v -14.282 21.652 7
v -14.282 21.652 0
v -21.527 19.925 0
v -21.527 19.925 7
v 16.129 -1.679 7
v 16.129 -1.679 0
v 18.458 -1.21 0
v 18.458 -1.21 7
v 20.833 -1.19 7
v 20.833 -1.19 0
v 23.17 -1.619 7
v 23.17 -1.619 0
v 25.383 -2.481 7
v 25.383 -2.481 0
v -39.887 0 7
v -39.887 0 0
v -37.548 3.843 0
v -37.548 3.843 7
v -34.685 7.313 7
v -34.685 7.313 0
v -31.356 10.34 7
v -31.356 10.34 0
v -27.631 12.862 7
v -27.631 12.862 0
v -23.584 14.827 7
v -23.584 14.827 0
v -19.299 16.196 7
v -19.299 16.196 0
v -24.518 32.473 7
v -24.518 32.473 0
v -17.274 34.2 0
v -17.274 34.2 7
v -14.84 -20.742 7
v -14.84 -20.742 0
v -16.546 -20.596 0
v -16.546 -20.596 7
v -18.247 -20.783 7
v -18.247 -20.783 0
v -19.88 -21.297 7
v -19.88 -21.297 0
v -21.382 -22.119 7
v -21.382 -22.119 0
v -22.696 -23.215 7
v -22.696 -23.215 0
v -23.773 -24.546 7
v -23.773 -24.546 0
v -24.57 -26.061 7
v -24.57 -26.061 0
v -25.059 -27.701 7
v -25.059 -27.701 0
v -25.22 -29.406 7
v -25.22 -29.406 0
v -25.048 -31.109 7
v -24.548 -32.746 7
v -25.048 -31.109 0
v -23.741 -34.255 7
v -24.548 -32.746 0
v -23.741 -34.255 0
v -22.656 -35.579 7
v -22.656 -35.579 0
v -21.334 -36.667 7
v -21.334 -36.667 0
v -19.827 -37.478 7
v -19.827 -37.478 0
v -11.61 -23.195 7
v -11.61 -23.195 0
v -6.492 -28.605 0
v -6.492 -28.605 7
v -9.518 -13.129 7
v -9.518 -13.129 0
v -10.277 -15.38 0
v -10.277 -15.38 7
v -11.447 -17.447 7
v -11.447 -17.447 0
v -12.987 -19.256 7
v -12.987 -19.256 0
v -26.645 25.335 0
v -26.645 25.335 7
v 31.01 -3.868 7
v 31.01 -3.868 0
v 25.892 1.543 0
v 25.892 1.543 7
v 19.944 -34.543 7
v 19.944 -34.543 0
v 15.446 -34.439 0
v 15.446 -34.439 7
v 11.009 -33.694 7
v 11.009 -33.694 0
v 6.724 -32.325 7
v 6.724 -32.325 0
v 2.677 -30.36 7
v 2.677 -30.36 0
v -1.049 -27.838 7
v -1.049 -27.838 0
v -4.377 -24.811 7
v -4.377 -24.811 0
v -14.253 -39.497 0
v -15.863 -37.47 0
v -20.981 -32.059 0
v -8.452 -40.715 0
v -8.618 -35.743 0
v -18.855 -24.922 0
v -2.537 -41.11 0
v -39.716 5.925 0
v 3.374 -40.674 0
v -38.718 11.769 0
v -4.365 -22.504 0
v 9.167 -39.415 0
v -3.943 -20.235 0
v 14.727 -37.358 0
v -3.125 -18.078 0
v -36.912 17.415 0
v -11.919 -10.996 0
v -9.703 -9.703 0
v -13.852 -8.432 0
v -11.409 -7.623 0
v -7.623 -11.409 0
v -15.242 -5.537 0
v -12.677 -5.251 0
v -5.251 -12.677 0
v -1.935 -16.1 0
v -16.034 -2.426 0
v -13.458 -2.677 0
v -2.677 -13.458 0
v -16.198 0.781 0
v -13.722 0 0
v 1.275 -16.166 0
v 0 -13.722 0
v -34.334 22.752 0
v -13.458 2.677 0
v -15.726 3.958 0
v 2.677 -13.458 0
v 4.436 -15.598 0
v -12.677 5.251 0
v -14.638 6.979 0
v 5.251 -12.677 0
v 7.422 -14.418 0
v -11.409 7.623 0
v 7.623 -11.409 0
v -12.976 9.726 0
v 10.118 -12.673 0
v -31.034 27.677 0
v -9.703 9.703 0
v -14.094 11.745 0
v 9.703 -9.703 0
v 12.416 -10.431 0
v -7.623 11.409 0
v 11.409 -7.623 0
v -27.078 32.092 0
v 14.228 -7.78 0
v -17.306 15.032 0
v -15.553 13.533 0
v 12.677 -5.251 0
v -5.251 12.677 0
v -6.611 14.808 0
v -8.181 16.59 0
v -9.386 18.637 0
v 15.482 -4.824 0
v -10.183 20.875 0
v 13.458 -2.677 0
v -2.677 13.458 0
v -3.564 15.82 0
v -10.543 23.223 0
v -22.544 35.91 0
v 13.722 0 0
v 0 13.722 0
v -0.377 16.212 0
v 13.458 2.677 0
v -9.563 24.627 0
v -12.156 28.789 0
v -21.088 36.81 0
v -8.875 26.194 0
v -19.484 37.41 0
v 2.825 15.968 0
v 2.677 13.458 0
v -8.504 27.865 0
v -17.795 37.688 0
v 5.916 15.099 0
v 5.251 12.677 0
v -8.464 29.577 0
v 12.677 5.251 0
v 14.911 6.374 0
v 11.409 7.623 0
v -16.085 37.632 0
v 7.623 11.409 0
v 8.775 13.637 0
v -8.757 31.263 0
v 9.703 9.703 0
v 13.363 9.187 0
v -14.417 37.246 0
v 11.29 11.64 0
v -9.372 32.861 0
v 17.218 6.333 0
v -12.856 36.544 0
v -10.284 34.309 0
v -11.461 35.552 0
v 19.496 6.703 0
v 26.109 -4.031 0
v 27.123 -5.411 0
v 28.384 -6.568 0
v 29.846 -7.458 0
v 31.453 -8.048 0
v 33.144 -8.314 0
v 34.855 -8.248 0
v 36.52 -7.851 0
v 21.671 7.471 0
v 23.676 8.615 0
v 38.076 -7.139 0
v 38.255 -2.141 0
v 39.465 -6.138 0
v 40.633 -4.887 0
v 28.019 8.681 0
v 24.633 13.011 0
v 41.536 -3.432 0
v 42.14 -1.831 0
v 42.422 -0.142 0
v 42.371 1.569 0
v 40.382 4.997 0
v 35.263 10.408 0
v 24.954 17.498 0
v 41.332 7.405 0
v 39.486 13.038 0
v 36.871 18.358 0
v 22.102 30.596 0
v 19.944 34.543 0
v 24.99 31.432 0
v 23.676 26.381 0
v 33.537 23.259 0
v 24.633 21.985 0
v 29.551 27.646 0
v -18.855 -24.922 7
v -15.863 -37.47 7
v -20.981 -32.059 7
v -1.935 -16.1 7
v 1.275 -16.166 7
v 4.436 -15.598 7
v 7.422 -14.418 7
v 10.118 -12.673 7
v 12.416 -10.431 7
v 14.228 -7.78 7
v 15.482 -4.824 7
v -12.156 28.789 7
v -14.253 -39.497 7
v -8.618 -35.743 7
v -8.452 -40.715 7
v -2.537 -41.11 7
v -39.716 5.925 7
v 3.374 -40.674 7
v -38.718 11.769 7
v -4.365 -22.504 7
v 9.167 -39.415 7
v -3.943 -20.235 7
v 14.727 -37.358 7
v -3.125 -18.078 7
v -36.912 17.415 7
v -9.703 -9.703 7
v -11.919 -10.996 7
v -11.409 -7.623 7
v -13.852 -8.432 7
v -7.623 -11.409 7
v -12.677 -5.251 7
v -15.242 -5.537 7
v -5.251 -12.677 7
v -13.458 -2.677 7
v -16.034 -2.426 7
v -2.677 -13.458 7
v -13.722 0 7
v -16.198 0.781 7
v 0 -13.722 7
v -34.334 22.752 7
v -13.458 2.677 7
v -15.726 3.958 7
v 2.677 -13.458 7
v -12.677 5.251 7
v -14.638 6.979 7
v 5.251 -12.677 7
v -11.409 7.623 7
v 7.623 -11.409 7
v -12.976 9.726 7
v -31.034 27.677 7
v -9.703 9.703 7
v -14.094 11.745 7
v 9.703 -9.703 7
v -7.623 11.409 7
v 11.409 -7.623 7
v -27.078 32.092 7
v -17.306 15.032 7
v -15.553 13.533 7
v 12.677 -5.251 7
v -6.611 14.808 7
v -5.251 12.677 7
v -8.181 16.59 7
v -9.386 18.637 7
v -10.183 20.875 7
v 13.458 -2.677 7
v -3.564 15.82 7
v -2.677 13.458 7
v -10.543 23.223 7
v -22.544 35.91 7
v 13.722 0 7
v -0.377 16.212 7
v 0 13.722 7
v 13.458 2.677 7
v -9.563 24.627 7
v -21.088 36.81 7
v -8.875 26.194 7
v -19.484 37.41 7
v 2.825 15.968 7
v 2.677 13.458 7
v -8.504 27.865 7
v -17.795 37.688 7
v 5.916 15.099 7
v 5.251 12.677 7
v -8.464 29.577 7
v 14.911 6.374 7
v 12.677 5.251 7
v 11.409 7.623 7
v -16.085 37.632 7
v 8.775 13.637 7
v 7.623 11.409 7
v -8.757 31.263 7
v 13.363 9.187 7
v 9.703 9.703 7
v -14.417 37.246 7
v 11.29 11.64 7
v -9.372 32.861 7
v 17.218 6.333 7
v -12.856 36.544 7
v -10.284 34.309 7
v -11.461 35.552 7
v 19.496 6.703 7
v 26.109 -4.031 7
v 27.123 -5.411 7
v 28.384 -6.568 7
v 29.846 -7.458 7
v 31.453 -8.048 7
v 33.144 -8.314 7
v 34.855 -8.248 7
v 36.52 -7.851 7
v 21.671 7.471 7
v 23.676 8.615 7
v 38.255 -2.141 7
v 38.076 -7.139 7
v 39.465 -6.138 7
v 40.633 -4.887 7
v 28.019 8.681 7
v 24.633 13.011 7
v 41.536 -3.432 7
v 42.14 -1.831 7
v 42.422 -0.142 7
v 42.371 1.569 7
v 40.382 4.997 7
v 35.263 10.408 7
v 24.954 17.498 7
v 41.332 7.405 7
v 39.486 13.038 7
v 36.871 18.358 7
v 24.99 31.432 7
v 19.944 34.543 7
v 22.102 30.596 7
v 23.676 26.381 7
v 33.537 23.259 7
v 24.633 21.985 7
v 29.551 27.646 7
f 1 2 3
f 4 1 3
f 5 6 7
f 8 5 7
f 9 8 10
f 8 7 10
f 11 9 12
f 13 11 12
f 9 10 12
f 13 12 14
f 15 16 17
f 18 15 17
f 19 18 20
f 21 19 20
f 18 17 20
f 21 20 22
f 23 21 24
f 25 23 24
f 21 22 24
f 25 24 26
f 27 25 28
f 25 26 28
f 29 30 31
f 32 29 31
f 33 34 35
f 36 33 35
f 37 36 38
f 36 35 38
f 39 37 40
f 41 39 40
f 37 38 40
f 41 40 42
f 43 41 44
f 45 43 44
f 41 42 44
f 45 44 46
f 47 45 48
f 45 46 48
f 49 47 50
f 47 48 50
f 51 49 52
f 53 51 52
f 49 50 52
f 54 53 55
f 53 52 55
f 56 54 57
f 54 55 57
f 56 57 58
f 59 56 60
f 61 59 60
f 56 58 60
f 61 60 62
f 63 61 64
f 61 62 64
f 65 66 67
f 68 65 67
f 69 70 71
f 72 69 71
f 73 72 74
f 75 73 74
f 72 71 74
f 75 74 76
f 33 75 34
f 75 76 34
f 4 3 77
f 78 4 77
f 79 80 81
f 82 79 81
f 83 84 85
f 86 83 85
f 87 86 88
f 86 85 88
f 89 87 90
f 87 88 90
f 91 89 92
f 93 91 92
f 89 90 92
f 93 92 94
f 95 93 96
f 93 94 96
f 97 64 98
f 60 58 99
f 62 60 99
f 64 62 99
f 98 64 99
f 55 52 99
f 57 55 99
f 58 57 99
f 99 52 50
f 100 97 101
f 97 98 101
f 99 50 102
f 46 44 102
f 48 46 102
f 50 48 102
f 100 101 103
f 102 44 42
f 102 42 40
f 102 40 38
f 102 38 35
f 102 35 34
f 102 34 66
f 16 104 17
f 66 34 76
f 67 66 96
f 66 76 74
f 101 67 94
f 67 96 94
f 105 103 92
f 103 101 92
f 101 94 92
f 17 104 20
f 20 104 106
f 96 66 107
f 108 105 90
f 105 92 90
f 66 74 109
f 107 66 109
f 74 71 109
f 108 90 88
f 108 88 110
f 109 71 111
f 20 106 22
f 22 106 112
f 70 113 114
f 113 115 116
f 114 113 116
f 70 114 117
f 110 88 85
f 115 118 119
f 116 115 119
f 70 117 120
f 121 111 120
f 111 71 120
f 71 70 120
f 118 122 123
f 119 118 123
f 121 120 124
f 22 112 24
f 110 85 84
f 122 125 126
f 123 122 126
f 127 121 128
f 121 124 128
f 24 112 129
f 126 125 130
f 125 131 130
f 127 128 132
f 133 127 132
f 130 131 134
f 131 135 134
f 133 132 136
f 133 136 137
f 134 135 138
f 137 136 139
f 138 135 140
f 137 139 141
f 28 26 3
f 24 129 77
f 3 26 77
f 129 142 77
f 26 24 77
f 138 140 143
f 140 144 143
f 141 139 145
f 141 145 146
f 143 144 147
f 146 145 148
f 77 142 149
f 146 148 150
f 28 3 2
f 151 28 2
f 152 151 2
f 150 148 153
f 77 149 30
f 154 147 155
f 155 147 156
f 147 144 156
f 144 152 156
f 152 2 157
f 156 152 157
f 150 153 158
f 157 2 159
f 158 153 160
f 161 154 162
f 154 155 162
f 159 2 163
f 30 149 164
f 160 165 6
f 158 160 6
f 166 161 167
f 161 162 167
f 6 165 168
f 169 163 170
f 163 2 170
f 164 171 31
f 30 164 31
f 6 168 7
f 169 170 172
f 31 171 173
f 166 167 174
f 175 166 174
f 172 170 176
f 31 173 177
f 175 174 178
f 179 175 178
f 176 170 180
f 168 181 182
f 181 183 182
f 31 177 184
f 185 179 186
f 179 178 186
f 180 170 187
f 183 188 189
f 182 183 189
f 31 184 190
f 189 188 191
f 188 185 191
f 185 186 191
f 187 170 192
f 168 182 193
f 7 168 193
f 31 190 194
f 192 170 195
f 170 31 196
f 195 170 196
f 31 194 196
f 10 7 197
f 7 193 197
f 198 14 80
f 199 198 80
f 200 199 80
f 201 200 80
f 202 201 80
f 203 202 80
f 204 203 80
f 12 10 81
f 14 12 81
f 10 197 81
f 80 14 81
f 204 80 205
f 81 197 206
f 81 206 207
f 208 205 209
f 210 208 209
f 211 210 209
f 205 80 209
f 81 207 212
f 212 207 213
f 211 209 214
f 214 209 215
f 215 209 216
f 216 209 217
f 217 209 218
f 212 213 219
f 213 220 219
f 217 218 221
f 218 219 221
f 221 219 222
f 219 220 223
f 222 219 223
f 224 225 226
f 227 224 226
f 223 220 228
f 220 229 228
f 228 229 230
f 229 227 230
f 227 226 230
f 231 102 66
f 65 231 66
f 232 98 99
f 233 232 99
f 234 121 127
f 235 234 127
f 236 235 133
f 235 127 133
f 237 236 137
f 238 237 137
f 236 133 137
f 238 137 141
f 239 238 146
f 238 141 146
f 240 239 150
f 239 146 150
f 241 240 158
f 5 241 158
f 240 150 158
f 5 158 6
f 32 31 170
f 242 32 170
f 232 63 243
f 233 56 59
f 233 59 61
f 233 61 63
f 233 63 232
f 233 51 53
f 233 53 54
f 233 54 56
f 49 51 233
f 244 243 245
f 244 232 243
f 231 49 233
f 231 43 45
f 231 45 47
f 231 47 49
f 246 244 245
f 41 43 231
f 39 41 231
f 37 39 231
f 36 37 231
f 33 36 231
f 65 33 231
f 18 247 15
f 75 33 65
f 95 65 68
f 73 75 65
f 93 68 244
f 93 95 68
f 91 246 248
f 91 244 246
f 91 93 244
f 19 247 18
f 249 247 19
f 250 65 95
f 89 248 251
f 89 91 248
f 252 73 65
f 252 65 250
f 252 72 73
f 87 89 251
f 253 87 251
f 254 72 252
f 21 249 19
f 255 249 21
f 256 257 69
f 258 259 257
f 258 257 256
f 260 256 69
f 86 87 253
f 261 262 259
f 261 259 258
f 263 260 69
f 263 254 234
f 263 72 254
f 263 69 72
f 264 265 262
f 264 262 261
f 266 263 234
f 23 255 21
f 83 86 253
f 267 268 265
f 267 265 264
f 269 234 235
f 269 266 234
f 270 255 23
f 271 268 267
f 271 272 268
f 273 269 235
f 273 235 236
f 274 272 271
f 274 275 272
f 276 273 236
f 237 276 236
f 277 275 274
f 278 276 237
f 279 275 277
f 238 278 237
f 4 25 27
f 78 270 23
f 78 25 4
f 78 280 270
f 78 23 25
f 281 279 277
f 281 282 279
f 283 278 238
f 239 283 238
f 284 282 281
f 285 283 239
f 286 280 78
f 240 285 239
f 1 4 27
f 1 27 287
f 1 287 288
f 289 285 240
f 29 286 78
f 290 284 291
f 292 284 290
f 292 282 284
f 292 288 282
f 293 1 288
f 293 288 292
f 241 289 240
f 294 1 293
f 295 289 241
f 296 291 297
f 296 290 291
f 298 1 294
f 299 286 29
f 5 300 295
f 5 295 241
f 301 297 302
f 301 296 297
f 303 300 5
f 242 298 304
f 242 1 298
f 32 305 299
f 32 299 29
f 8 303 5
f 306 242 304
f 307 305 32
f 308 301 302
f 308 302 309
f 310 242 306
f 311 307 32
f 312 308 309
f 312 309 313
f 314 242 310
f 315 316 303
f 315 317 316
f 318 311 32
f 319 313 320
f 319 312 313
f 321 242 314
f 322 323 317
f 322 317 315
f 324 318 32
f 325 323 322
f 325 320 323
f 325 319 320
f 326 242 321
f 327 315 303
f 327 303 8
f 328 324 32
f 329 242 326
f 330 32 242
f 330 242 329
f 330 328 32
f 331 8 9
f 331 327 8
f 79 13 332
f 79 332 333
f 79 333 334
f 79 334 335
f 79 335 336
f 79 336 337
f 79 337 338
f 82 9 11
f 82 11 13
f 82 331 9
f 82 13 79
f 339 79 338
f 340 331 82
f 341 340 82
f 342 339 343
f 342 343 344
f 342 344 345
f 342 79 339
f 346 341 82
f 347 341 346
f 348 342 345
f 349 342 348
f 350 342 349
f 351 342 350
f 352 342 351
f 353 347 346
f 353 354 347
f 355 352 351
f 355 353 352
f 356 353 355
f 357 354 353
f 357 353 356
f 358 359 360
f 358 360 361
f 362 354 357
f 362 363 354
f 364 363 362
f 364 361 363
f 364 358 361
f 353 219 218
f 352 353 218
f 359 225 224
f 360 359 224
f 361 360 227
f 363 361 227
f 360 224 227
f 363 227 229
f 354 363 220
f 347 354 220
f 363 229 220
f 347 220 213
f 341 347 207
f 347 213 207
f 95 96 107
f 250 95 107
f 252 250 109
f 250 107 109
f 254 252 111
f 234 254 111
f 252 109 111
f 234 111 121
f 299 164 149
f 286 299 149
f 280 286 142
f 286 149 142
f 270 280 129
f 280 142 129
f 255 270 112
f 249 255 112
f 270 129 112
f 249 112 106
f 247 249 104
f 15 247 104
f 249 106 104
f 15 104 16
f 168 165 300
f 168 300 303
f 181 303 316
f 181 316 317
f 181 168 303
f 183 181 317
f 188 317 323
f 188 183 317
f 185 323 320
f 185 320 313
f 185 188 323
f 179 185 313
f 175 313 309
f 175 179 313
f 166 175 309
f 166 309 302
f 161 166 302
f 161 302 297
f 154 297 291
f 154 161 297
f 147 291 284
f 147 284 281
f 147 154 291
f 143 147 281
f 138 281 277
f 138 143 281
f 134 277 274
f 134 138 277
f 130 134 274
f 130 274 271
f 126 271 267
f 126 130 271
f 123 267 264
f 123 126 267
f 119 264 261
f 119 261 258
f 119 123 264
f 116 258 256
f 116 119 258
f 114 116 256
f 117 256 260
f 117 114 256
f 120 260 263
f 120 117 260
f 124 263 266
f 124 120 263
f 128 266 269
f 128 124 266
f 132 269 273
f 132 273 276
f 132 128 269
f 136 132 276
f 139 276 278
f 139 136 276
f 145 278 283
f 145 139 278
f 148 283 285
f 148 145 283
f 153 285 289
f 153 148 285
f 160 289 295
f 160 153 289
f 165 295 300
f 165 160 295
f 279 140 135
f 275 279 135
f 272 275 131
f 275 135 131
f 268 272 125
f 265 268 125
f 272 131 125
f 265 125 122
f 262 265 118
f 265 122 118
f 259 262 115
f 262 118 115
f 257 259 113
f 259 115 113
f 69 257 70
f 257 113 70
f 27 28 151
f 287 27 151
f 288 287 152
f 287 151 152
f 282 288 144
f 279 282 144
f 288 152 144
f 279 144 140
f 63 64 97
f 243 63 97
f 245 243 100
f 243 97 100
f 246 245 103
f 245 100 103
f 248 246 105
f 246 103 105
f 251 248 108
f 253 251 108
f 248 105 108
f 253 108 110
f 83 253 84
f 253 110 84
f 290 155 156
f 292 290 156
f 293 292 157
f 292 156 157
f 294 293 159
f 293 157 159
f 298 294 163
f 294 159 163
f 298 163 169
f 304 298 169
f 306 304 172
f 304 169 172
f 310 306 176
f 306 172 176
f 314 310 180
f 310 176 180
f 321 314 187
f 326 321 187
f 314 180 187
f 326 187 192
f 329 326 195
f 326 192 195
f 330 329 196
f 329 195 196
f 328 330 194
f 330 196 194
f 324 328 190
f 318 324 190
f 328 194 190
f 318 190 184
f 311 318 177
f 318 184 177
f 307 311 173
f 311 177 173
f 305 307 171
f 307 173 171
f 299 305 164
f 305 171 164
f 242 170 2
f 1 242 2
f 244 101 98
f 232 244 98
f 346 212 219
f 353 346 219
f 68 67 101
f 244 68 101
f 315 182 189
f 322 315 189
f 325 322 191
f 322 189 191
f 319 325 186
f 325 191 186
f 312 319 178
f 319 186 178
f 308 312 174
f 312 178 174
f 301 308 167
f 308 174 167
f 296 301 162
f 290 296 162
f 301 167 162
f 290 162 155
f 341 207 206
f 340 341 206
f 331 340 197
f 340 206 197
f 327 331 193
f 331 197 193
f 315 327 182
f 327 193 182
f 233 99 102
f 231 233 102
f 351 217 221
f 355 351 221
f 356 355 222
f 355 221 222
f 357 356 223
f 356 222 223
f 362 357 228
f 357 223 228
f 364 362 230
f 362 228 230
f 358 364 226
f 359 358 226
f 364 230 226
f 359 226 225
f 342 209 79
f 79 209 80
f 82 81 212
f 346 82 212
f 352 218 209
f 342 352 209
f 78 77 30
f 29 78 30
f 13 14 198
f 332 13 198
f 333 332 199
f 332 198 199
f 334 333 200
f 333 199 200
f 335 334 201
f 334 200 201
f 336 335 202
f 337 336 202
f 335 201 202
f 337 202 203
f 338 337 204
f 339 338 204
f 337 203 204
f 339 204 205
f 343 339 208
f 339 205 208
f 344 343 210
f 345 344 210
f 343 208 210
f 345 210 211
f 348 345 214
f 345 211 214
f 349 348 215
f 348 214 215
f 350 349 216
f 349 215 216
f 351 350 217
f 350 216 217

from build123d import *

# Parameters (mm, degrees)
F0_R     = 13.7215429526
F1_DEPTH = 7


# Not quite as in the source:
# - a feature names something its author has since deleted; it is built from what else it names


with BuildPart() as f1:
    # F0 (on Top) → F1 (new body)
    with BuildSketch(Plane.XY):
        with BuildLine():
            ThreePointArc((14.9110873094, 6.3741742194), (15.8866974997, 3.2532236753), (16.216368944, 0))
            ThreePointArc((16.216368944, 0), (16.1945778873, -0.8403979891), (16.1292632815, -1.6785373763))
            ThreePointArc((16.1292632815, -1.6785373763), (20.8333456957, -1.1898932874), (25.3830228197, -2.4812501212))
            ThreePointArc((25.3830228197, -2.4812501212), (35.6967714149, -8.0901996637), (42.370743035, 1.5685698162))
            ThreePointArc((42.370743035, 1.5685698162), (35.2903205619, 20.8670320083), (19.9436064757, 34.5433397021))
            ThreePointArc((19.9436064757, 34.5433397021), (24.6328655558, 21.9854776837), (23.6756761013, 8.6148816783))
            ThreePointArc((23.6756761013, 8.6148816783), (19.495827516, 6.702655598), (14.9110873094, 6.3741742194))
        make_face()
        Polygon((35.2634771892, 10.4077201887), (40.3816163825, 4.9971147515), (38.2549642206, -2.1406265287), (31.0101728654, -3.8677623716), (25.8920336721, 1.5428430657), (28.018685834, 8.6805843458), align=None, mode=Mode.SUBTRACT)
        with BuildLine():
            ThreePointArc((16.1292632815, -1.6785373763), (16.1945778873, -0.8403979891), (16.216368944, 0))
            ThreePointArc((16.216368944, 0), (15.8866974997, 3.2532236753), (14.9110873094, 6.3741742194))
            ThreePointArc((14.9110873094, 6.3741742194), (5.9163939381, 15.0985729292), (-6.6109756317, 14.8076204343))
            ThreePointArc((-6.6109756317, 14.8076204343), (-10.1175507485, 12.6730339138), (-12.9757404569, 9.7262932983))
            ThreePointArc((-12.9757404569, 9.7262932983), (-16.0339446866, -2.4255390154), (-9.5182876499, -13.129083058))
            ThreePointArc((-9.5182876499, -13.129083058), (-5.9163939381, -15.0985729292), (-1.9353468525, -16.1004675177))
            ThreePointArc((-1.9353468525, -16.1004675177), (10.1175507485, -12.6730339138), (16.1292632815, -1.6785373763))
        make_face()
        Circle(F0_R, mode=Mode.SUBTRACT)
        with BuildLine():
            ThreePointArc((-4.3771316667, -24.8111777947), (-3.9432437373, -20.2352096957), (-1.9353468525, -16.1004675177))
            ThreePointArc((-1.9353468525, -16.1004675177), (-5.9163939381, -15.0985729292), (-9.5182876499, -13.129083058))
            ThreePointArc((-9.5182876499, -13.129083058), (-11.4471506626, -17.4472599746), (-14.840337048, -20.7417175261))
            ThreePointArc((-14.840337048, -20.7417175261), (-24.8547041379, -26.8692110465), (-19.826950209, -37.4784247537))
            ThreePointArc((-19.826950209, -37.4784247537), (0.4262195398, -40.9958301185), (19.9436064757, -34.5433397021))
            ThreePointArc((19.9436064757, -34.5433397021), (6.7235494105, -32.3254261812), (-4.3771316667, -24.8111777947))
        make_face()
        Polygon((-8.6183885157, -35.742927166), (-15.8631798709, -37.4700630089), (-20.9813190642, -32.0594575716), (-18.8546669023, -24.9217162914), (-11.6098755471, -23.1945804485), (-6.4917363538, -28.6051858858), align=None, mode=Mode.SUBTRACT)
        with BuildLine():
            ThreePointArc((-12.9757404569, 9.7262932983), (-10.1175507485, 12.6730339138), (-6.6109756317, 14.8076204343))
            ThreePointArc((-6.6109756317, 14.8076204343), (-9.3861950332, 18.637153262), (-10.5426857718, 23.2229676473))
            ThreePointArc((-10.5426857718, 23.2229676473), (-10.8420672769, 34.9594107102), (-22.543792826, 35.9098549374))
            ThreePointArc((-22.543792826, 35.9098549374), (-35.7165401018, 20.1287981101), (-39.8872129515, 0))
            ThreePointArc((-39.8872129515, 0), (-31.3564149663, 10.3399484975), (-19.2985444346, 16.1962961164))
            ThreePointArc((-19.2985444346, 16.1962961164), (-15.5525837787, 13.5325540977), (-12.9757404569, 9.7262932983))
        make_face()
        Polygon((-24.5184365116, 32.4729482574), (-17.2736451565, 34.2000841003), (-12.1555059631, 28.789478663), (-14.282158125, 21.6517373829), (-21.5269494802, 19.92460154), (-26.6450886735, 25.3352069772), align=None, mode=Mode.SUBTRACT)
    extrude(amount=F1_DEPTH)


solid = f1.part
